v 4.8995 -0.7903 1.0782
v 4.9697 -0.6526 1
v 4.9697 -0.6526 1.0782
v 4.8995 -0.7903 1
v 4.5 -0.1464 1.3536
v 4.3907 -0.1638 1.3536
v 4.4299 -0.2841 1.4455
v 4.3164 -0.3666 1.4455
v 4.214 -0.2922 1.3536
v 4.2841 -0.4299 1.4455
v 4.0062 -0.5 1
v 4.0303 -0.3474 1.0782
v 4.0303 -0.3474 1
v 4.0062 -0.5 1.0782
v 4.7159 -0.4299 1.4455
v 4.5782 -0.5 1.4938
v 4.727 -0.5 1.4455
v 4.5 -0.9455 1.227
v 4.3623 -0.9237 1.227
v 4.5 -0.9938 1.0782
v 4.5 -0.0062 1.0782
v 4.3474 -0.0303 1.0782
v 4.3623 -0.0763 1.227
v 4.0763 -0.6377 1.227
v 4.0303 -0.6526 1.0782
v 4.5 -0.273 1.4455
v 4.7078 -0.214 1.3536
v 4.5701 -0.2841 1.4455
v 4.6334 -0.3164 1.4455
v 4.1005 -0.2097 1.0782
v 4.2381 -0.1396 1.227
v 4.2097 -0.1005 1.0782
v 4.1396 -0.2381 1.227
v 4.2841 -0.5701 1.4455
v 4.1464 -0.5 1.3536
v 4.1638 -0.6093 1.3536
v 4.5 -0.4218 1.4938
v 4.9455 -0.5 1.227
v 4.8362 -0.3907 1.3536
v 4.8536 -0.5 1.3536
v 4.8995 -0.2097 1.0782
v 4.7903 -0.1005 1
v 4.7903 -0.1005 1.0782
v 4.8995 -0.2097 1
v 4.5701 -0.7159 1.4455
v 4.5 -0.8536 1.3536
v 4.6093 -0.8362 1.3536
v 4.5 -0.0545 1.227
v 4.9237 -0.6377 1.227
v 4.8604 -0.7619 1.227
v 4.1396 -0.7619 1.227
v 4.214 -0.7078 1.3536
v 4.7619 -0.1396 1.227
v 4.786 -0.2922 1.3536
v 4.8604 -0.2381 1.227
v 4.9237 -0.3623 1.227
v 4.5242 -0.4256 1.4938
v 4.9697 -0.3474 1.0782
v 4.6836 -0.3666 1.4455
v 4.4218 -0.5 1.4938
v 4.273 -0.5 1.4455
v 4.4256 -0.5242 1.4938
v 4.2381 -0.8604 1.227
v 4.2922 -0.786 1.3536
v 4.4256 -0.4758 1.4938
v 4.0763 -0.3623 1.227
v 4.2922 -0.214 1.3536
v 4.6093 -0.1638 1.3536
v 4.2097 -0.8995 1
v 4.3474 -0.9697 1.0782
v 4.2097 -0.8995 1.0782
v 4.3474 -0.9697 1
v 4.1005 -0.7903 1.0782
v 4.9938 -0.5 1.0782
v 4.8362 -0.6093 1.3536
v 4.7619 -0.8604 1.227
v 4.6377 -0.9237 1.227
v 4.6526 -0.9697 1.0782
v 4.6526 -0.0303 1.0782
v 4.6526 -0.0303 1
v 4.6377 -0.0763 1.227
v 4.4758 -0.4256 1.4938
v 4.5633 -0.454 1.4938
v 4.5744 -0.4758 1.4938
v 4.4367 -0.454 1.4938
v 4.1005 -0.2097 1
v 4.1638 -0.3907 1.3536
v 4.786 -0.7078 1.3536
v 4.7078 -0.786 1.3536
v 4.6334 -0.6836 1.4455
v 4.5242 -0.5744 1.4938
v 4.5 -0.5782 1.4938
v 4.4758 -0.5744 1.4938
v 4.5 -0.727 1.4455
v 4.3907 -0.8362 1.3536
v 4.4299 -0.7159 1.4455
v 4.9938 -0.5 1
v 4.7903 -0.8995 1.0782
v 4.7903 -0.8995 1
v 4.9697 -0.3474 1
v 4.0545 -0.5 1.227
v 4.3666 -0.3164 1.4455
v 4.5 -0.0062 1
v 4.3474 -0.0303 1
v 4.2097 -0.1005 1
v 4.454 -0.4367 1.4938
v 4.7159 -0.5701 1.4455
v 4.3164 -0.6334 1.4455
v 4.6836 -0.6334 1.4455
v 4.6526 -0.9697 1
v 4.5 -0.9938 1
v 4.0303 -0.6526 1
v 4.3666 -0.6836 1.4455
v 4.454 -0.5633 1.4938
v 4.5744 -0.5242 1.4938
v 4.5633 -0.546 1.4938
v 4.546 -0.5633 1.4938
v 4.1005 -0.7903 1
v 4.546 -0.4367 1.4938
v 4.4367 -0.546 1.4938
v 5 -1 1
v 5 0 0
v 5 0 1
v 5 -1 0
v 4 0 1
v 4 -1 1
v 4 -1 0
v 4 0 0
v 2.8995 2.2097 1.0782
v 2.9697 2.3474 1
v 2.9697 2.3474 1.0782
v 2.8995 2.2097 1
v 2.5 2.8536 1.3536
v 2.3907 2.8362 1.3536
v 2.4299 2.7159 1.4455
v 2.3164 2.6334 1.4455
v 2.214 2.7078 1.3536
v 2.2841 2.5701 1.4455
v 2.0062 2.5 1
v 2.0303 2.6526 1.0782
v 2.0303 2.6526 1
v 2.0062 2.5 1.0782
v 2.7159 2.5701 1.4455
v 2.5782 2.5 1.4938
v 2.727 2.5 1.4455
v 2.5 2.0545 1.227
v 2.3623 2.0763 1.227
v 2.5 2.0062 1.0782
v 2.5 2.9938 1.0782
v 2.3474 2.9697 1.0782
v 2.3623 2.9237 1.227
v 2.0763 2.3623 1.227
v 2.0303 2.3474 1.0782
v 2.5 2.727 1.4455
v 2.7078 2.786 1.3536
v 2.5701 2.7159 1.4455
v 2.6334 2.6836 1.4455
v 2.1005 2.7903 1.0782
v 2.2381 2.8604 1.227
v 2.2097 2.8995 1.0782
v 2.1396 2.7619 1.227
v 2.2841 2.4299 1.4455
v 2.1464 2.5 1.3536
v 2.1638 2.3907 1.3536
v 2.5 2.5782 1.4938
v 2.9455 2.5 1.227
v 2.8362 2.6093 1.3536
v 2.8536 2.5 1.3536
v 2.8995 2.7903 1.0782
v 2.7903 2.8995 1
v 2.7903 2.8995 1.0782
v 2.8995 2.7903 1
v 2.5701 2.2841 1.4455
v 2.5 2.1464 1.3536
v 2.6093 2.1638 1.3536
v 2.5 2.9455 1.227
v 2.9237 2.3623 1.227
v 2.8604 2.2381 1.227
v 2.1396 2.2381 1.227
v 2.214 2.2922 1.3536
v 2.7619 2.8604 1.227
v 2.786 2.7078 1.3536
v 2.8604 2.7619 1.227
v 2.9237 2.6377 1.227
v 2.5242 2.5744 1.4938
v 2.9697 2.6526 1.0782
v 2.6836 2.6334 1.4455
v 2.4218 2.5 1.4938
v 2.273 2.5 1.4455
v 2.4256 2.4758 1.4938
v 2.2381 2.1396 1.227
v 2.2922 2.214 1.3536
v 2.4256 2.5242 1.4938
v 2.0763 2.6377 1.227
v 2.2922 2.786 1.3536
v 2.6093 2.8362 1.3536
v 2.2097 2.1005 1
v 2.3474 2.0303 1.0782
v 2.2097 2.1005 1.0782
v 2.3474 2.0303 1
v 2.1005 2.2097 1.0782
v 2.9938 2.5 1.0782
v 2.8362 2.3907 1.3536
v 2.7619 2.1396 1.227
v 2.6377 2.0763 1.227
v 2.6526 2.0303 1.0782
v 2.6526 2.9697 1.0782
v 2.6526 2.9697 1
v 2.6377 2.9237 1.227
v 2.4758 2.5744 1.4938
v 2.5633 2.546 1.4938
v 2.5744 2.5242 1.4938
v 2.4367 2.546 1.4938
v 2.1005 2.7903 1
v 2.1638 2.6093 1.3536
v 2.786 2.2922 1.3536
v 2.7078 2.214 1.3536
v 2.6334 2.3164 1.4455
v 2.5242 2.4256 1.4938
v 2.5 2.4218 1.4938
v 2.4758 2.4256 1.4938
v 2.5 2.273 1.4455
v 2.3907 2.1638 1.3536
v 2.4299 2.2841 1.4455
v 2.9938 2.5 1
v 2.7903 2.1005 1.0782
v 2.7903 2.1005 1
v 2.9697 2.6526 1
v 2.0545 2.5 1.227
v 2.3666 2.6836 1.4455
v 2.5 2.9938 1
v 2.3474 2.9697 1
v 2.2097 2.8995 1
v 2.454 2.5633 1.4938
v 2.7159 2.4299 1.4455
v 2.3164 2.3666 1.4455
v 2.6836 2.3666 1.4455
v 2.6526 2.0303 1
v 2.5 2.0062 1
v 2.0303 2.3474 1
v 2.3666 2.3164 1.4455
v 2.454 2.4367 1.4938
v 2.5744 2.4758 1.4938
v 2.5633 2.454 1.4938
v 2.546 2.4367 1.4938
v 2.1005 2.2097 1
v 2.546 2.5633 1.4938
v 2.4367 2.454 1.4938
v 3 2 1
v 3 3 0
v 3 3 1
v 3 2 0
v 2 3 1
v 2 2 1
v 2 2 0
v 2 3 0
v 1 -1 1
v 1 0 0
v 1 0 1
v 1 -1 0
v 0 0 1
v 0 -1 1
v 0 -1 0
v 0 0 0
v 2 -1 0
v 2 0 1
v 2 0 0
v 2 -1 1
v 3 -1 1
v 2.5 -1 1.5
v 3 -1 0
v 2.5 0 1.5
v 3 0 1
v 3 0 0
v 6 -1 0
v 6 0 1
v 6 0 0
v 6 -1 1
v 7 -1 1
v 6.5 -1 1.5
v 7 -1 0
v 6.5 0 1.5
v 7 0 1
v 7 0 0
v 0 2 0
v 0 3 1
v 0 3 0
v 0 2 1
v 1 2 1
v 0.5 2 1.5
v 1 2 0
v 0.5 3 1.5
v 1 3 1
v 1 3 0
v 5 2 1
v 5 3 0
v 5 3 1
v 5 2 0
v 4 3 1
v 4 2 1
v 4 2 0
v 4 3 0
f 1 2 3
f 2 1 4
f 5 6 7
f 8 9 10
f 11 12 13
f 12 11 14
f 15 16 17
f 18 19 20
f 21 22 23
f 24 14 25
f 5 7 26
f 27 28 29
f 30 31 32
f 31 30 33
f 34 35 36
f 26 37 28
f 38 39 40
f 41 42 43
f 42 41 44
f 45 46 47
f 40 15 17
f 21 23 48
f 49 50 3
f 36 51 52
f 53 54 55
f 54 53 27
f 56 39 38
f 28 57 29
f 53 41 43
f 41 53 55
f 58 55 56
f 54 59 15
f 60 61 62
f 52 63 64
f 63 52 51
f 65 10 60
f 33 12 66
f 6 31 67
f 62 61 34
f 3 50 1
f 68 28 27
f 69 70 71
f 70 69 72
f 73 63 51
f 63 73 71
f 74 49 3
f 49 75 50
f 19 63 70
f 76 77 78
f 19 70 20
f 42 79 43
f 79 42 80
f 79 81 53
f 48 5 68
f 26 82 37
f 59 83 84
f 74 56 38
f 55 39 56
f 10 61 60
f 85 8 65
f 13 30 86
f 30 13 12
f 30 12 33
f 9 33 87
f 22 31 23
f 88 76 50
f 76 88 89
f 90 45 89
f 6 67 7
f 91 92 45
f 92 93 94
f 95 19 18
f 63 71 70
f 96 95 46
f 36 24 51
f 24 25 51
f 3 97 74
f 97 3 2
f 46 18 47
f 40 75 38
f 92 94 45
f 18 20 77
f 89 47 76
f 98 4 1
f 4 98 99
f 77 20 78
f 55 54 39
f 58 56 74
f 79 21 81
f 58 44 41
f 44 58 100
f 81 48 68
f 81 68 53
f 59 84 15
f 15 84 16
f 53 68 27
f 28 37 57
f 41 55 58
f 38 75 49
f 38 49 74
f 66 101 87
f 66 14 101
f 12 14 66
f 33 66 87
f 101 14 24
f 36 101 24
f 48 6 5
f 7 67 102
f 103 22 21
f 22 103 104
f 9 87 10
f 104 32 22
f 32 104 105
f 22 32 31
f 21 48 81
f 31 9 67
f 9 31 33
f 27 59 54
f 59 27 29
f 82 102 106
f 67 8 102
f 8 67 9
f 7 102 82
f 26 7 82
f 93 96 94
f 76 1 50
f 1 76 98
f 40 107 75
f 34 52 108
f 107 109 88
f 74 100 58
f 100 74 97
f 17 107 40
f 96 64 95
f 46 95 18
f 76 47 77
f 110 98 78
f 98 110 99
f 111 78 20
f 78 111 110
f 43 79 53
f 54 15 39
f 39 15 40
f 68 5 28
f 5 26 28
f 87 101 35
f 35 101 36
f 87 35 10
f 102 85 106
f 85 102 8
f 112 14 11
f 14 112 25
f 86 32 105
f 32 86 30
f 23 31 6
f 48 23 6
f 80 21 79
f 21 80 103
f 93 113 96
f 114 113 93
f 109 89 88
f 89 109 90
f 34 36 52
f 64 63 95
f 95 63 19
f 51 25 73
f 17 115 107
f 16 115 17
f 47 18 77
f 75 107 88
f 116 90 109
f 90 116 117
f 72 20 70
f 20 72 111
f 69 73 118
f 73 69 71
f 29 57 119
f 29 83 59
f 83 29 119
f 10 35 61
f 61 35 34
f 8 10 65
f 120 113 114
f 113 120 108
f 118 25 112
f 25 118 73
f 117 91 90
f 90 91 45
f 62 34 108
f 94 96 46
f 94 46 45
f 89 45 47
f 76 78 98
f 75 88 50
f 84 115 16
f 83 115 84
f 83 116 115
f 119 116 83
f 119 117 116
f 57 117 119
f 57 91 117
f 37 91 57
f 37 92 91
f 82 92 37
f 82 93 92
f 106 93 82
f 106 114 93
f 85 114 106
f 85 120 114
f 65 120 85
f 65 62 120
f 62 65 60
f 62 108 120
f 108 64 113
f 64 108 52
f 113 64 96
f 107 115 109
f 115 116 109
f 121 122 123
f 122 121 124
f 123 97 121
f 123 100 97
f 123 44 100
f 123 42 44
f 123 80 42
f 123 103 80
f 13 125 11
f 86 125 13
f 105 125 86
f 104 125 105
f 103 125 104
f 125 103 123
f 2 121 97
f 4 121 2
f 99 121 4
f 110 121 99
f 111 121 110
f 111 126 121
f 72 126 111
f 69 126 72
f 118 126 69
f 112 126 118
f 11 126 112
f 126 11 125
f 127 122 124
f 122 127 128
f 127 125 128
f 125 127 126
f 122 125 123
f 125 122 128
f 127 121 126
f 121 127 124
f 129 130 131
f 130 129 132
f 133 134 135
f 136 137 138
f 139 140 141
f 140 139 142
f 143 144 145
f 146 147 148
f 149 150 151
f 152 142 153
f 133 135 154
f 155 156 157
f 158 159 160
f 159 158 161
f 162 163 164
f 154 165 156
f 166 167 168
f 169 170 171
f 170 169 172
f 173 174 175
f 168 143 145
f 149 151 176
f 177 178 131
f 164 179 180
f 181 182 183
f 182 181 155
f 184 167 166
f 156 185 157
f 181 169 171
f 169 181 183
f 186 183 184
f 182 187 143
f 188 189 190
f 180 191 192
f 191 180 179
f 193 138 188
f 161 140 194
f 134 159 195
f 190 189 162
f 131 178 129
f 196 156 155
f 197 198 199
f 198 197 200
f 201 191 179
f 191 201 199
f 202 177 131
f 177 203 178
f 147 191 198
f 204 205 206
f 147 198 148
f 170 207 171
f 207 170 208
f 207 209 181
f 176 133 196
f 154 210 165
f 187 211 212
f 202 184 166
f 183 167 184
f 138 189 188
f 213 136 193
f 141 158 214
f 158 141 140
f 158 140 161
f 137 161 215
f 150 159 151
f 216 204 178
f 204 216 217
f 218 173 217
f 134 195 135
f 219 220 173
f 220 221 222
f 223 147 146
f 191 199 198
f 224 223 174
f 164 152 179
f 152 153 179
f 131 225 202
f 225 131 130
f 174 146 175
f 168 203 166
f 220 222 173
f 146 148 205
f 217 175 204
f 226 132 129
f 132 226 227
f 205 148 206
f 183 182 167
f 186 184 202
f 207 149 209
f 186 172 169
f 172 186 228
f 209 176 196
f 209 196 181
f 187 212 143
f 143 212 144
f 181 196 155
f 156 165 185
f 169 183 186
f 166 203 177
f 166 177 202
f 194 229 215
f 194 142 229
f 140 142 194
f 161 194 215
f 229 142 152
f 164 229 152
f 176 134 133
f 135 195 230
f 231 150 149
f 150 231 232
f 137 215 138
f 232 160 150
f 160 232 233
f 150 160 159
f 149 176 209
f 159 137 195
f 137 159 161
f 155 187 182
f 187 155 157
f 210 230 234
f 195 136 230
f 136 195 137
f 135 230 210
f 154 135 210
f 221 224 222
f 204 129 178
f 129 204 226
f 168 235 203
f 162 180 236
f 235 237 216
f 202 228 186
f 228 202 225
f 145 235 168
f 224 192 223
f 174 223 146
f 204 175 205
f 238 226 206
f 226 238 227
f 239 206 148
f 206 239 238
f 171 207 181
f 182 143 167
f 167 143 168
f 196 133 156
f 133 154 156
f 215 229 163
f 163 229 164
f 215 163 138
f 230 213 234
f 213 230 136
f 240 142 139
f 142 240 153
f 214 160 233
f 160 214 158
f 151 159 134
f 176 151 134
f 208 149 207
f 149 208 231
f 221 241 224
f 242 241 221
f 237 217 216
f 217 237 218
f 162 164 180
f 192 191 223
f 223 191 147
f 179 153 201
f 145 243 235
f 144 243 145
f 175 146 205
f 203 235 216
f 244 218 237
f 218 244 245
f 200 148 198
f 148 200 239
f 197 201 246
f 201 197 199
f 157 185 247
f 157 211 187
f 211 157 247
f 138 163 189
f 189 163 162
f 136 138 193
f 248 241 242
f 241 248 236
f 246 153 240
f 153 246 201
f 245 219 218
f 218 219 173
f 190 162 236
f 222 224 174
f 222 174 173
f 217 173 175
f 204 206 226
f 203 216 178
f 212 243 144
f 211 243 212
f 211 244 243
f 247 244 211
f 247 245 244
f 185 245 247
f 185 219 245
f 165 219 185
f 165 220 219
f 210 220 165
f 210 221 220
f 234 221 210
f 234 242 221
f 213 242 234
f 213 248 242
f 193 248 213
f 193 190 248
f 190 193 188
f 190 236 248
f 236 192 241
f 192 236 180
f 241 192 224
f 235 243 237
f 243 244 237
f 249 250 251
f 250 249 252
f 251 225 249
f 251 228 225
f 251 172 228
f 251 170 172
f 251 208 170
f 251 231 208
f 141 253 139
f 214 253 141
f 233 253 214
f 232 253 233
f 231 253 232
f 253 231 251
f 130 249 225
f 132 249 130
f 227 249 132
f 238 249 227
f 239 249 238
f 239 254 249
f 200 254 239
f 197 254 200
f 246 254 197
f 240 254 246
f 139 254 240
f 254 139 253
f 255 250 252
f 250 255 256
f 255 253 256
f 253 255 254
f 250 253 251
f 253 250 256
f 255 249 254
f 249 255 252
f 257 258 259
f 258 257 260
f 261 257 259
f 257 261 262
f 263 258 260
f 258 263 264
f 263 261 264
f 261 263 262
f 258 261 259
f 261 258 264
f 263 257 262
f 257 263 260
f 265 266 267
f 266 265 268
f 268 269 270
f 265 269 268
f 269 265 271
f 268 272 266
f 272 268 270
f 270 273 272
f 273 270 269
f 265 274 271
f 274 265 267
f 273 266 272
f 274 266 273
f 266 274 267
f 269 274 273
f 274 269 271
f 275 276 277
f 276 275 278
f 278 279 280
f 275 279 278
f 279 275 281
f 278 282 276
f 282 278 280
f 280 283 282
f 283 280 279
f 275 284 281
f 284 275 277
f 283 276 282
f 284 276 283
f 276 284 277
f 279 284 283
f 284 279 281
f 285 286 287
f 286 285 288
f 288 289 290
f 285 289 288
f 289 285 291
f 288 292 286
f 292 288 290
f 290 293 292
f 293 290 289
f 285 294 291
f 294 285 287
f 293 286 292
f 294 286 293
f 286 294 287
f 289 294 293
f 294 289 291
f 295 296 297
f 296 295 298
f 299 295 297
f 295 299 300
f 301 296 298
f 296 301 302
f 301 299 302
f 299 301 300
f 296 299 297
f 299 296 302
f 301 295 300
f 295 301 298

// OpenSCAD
//*https://en.wikibooks.org/wiki/OpenSCAD_User_Manual/User-Defined_Functions_and_Modules#Children%20

module house(roof="flat",paint=[1,0,0]) {
   color(paint)
   if(roof=="flat") { translate([0,-1,0]) cube(); }
   else if(roof=="pitched") {
     rotate([90,0,0]) linear_extrude(height=1)
     polygon(points=[[0,0],[0,1],[0.5,1.5],[1,1],[1,0]]); }
   else if(roof=="domical") {
     translate([0,-1,0]){
       translate([0.5,0.5,1]) sphere(r=0.5,$fn=20); cube(); }
} }

                   house();
translate([2,0,0]) house("pitched");
translate([4,0,0]) house("domical",[0,1,0]);
translate([6,0,0]) house(roof="pitched",paint=[0,0,1]);
translate([0,3,0]) house(paint=[0,0,0],roof="pitched");
translate([2,3,0]) house(roof="domical");
translate([4,3,0]) house(paint=[0,0.5,0.5]);
